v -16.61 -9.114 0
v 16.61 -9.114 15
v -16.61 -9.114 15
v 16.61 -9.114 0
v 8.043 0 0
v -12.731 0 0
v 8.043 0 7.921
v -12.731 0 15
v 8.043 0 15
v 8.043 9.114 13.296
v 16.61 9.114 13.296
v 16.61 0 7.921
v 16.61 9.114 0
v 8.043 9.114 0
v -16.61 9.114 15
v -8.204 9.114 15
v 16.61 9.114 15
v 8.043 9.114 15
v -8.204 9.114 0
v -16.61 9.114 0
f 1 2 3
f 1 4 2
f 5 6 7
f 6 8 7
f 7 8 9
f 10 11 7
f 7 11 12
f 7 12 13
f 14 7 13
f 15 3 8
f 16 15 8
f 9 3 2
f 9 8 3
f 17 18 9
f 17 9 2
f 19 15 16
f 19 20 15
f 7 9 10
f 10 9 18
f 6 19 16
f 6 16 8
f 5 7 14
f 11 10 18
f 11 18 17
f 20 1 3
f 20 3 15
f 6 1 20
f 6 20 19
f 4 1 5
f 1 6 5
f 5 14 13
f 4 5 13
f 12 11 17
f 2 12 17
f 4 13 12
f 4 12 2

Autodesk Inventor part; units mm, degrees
ref_plane "YZ Plane" through (0, 0, 0) normal (1, 0, 0) x (0, 1, 0)
ref_plane "XZ Plane" through (0, 0, 0) normal (0, 1, 0) x (-1, 0, 0)
ref_plane "XY Plane" through (0, 0, 0) normal (0, 0, 1) x (1, 0, 0)
sketch "스케치1" plane through (0, 0, 0) normal (0, 0, 1) x (1, 0, 0)
  line L0 (16.6105, -9.1135) -> (-16.6105, -9.1135)
  line L1 (-16.6105, -9.1135) -> (-16.6105, 9.1135)
  line L2 (-16.6105, 9.1135) -> (16.6105, 9.1135)
  line L3 (16.6105, 9.1135) -> (16.6105, -9.1135)
  line L4 (16.6105, -9.1135) -> (-16.6105, 9.1135) construction
  line L5 (-16.6105, -9.1135) -> (16.6105, 9.1135) construction
  point P0 (0, 0)
extrude "돌출1" add sketch "스케치1" along normal blind 15
sketch "스케치2" plane through (0, 0, 15) normal (0, 0, 1) x (1, 0, 0)
  line L0 (16.6105, 9.1135) -> (-16.6105, 9.1135) projected
  line L1 (-8.2042, 9.1135) -> (-12.7307, 0)
  line L2 (-12.7307, 0) -> (8.0426, 0)
  line L3 (8.0426, 0) -> (8.0426, 9.1135)
  point P0 (0, 0)
extrude "돌출2" cut sketch "스케치2" against normal blind 15
sketch "스케치3" plane through (16.6105, -9.1135, 0) normal (1, 0, 0) x (0, 0, -1)
  line L0 (0, 18.2271) -> (-15, 18.2271) projected
  line L1 (-13.2965, 18.2271) -> (-7.9213, 9.1135)
  line L2 (-15, 9.1135) -> (0, 9.1135) projected
  line L3 (-7.9213, 9.1135) -> (0, 18.2271)
extrude "돌출3" cut sketch "스케치3" against normal blind 15
properties part number "240503_3Dsketch09"
